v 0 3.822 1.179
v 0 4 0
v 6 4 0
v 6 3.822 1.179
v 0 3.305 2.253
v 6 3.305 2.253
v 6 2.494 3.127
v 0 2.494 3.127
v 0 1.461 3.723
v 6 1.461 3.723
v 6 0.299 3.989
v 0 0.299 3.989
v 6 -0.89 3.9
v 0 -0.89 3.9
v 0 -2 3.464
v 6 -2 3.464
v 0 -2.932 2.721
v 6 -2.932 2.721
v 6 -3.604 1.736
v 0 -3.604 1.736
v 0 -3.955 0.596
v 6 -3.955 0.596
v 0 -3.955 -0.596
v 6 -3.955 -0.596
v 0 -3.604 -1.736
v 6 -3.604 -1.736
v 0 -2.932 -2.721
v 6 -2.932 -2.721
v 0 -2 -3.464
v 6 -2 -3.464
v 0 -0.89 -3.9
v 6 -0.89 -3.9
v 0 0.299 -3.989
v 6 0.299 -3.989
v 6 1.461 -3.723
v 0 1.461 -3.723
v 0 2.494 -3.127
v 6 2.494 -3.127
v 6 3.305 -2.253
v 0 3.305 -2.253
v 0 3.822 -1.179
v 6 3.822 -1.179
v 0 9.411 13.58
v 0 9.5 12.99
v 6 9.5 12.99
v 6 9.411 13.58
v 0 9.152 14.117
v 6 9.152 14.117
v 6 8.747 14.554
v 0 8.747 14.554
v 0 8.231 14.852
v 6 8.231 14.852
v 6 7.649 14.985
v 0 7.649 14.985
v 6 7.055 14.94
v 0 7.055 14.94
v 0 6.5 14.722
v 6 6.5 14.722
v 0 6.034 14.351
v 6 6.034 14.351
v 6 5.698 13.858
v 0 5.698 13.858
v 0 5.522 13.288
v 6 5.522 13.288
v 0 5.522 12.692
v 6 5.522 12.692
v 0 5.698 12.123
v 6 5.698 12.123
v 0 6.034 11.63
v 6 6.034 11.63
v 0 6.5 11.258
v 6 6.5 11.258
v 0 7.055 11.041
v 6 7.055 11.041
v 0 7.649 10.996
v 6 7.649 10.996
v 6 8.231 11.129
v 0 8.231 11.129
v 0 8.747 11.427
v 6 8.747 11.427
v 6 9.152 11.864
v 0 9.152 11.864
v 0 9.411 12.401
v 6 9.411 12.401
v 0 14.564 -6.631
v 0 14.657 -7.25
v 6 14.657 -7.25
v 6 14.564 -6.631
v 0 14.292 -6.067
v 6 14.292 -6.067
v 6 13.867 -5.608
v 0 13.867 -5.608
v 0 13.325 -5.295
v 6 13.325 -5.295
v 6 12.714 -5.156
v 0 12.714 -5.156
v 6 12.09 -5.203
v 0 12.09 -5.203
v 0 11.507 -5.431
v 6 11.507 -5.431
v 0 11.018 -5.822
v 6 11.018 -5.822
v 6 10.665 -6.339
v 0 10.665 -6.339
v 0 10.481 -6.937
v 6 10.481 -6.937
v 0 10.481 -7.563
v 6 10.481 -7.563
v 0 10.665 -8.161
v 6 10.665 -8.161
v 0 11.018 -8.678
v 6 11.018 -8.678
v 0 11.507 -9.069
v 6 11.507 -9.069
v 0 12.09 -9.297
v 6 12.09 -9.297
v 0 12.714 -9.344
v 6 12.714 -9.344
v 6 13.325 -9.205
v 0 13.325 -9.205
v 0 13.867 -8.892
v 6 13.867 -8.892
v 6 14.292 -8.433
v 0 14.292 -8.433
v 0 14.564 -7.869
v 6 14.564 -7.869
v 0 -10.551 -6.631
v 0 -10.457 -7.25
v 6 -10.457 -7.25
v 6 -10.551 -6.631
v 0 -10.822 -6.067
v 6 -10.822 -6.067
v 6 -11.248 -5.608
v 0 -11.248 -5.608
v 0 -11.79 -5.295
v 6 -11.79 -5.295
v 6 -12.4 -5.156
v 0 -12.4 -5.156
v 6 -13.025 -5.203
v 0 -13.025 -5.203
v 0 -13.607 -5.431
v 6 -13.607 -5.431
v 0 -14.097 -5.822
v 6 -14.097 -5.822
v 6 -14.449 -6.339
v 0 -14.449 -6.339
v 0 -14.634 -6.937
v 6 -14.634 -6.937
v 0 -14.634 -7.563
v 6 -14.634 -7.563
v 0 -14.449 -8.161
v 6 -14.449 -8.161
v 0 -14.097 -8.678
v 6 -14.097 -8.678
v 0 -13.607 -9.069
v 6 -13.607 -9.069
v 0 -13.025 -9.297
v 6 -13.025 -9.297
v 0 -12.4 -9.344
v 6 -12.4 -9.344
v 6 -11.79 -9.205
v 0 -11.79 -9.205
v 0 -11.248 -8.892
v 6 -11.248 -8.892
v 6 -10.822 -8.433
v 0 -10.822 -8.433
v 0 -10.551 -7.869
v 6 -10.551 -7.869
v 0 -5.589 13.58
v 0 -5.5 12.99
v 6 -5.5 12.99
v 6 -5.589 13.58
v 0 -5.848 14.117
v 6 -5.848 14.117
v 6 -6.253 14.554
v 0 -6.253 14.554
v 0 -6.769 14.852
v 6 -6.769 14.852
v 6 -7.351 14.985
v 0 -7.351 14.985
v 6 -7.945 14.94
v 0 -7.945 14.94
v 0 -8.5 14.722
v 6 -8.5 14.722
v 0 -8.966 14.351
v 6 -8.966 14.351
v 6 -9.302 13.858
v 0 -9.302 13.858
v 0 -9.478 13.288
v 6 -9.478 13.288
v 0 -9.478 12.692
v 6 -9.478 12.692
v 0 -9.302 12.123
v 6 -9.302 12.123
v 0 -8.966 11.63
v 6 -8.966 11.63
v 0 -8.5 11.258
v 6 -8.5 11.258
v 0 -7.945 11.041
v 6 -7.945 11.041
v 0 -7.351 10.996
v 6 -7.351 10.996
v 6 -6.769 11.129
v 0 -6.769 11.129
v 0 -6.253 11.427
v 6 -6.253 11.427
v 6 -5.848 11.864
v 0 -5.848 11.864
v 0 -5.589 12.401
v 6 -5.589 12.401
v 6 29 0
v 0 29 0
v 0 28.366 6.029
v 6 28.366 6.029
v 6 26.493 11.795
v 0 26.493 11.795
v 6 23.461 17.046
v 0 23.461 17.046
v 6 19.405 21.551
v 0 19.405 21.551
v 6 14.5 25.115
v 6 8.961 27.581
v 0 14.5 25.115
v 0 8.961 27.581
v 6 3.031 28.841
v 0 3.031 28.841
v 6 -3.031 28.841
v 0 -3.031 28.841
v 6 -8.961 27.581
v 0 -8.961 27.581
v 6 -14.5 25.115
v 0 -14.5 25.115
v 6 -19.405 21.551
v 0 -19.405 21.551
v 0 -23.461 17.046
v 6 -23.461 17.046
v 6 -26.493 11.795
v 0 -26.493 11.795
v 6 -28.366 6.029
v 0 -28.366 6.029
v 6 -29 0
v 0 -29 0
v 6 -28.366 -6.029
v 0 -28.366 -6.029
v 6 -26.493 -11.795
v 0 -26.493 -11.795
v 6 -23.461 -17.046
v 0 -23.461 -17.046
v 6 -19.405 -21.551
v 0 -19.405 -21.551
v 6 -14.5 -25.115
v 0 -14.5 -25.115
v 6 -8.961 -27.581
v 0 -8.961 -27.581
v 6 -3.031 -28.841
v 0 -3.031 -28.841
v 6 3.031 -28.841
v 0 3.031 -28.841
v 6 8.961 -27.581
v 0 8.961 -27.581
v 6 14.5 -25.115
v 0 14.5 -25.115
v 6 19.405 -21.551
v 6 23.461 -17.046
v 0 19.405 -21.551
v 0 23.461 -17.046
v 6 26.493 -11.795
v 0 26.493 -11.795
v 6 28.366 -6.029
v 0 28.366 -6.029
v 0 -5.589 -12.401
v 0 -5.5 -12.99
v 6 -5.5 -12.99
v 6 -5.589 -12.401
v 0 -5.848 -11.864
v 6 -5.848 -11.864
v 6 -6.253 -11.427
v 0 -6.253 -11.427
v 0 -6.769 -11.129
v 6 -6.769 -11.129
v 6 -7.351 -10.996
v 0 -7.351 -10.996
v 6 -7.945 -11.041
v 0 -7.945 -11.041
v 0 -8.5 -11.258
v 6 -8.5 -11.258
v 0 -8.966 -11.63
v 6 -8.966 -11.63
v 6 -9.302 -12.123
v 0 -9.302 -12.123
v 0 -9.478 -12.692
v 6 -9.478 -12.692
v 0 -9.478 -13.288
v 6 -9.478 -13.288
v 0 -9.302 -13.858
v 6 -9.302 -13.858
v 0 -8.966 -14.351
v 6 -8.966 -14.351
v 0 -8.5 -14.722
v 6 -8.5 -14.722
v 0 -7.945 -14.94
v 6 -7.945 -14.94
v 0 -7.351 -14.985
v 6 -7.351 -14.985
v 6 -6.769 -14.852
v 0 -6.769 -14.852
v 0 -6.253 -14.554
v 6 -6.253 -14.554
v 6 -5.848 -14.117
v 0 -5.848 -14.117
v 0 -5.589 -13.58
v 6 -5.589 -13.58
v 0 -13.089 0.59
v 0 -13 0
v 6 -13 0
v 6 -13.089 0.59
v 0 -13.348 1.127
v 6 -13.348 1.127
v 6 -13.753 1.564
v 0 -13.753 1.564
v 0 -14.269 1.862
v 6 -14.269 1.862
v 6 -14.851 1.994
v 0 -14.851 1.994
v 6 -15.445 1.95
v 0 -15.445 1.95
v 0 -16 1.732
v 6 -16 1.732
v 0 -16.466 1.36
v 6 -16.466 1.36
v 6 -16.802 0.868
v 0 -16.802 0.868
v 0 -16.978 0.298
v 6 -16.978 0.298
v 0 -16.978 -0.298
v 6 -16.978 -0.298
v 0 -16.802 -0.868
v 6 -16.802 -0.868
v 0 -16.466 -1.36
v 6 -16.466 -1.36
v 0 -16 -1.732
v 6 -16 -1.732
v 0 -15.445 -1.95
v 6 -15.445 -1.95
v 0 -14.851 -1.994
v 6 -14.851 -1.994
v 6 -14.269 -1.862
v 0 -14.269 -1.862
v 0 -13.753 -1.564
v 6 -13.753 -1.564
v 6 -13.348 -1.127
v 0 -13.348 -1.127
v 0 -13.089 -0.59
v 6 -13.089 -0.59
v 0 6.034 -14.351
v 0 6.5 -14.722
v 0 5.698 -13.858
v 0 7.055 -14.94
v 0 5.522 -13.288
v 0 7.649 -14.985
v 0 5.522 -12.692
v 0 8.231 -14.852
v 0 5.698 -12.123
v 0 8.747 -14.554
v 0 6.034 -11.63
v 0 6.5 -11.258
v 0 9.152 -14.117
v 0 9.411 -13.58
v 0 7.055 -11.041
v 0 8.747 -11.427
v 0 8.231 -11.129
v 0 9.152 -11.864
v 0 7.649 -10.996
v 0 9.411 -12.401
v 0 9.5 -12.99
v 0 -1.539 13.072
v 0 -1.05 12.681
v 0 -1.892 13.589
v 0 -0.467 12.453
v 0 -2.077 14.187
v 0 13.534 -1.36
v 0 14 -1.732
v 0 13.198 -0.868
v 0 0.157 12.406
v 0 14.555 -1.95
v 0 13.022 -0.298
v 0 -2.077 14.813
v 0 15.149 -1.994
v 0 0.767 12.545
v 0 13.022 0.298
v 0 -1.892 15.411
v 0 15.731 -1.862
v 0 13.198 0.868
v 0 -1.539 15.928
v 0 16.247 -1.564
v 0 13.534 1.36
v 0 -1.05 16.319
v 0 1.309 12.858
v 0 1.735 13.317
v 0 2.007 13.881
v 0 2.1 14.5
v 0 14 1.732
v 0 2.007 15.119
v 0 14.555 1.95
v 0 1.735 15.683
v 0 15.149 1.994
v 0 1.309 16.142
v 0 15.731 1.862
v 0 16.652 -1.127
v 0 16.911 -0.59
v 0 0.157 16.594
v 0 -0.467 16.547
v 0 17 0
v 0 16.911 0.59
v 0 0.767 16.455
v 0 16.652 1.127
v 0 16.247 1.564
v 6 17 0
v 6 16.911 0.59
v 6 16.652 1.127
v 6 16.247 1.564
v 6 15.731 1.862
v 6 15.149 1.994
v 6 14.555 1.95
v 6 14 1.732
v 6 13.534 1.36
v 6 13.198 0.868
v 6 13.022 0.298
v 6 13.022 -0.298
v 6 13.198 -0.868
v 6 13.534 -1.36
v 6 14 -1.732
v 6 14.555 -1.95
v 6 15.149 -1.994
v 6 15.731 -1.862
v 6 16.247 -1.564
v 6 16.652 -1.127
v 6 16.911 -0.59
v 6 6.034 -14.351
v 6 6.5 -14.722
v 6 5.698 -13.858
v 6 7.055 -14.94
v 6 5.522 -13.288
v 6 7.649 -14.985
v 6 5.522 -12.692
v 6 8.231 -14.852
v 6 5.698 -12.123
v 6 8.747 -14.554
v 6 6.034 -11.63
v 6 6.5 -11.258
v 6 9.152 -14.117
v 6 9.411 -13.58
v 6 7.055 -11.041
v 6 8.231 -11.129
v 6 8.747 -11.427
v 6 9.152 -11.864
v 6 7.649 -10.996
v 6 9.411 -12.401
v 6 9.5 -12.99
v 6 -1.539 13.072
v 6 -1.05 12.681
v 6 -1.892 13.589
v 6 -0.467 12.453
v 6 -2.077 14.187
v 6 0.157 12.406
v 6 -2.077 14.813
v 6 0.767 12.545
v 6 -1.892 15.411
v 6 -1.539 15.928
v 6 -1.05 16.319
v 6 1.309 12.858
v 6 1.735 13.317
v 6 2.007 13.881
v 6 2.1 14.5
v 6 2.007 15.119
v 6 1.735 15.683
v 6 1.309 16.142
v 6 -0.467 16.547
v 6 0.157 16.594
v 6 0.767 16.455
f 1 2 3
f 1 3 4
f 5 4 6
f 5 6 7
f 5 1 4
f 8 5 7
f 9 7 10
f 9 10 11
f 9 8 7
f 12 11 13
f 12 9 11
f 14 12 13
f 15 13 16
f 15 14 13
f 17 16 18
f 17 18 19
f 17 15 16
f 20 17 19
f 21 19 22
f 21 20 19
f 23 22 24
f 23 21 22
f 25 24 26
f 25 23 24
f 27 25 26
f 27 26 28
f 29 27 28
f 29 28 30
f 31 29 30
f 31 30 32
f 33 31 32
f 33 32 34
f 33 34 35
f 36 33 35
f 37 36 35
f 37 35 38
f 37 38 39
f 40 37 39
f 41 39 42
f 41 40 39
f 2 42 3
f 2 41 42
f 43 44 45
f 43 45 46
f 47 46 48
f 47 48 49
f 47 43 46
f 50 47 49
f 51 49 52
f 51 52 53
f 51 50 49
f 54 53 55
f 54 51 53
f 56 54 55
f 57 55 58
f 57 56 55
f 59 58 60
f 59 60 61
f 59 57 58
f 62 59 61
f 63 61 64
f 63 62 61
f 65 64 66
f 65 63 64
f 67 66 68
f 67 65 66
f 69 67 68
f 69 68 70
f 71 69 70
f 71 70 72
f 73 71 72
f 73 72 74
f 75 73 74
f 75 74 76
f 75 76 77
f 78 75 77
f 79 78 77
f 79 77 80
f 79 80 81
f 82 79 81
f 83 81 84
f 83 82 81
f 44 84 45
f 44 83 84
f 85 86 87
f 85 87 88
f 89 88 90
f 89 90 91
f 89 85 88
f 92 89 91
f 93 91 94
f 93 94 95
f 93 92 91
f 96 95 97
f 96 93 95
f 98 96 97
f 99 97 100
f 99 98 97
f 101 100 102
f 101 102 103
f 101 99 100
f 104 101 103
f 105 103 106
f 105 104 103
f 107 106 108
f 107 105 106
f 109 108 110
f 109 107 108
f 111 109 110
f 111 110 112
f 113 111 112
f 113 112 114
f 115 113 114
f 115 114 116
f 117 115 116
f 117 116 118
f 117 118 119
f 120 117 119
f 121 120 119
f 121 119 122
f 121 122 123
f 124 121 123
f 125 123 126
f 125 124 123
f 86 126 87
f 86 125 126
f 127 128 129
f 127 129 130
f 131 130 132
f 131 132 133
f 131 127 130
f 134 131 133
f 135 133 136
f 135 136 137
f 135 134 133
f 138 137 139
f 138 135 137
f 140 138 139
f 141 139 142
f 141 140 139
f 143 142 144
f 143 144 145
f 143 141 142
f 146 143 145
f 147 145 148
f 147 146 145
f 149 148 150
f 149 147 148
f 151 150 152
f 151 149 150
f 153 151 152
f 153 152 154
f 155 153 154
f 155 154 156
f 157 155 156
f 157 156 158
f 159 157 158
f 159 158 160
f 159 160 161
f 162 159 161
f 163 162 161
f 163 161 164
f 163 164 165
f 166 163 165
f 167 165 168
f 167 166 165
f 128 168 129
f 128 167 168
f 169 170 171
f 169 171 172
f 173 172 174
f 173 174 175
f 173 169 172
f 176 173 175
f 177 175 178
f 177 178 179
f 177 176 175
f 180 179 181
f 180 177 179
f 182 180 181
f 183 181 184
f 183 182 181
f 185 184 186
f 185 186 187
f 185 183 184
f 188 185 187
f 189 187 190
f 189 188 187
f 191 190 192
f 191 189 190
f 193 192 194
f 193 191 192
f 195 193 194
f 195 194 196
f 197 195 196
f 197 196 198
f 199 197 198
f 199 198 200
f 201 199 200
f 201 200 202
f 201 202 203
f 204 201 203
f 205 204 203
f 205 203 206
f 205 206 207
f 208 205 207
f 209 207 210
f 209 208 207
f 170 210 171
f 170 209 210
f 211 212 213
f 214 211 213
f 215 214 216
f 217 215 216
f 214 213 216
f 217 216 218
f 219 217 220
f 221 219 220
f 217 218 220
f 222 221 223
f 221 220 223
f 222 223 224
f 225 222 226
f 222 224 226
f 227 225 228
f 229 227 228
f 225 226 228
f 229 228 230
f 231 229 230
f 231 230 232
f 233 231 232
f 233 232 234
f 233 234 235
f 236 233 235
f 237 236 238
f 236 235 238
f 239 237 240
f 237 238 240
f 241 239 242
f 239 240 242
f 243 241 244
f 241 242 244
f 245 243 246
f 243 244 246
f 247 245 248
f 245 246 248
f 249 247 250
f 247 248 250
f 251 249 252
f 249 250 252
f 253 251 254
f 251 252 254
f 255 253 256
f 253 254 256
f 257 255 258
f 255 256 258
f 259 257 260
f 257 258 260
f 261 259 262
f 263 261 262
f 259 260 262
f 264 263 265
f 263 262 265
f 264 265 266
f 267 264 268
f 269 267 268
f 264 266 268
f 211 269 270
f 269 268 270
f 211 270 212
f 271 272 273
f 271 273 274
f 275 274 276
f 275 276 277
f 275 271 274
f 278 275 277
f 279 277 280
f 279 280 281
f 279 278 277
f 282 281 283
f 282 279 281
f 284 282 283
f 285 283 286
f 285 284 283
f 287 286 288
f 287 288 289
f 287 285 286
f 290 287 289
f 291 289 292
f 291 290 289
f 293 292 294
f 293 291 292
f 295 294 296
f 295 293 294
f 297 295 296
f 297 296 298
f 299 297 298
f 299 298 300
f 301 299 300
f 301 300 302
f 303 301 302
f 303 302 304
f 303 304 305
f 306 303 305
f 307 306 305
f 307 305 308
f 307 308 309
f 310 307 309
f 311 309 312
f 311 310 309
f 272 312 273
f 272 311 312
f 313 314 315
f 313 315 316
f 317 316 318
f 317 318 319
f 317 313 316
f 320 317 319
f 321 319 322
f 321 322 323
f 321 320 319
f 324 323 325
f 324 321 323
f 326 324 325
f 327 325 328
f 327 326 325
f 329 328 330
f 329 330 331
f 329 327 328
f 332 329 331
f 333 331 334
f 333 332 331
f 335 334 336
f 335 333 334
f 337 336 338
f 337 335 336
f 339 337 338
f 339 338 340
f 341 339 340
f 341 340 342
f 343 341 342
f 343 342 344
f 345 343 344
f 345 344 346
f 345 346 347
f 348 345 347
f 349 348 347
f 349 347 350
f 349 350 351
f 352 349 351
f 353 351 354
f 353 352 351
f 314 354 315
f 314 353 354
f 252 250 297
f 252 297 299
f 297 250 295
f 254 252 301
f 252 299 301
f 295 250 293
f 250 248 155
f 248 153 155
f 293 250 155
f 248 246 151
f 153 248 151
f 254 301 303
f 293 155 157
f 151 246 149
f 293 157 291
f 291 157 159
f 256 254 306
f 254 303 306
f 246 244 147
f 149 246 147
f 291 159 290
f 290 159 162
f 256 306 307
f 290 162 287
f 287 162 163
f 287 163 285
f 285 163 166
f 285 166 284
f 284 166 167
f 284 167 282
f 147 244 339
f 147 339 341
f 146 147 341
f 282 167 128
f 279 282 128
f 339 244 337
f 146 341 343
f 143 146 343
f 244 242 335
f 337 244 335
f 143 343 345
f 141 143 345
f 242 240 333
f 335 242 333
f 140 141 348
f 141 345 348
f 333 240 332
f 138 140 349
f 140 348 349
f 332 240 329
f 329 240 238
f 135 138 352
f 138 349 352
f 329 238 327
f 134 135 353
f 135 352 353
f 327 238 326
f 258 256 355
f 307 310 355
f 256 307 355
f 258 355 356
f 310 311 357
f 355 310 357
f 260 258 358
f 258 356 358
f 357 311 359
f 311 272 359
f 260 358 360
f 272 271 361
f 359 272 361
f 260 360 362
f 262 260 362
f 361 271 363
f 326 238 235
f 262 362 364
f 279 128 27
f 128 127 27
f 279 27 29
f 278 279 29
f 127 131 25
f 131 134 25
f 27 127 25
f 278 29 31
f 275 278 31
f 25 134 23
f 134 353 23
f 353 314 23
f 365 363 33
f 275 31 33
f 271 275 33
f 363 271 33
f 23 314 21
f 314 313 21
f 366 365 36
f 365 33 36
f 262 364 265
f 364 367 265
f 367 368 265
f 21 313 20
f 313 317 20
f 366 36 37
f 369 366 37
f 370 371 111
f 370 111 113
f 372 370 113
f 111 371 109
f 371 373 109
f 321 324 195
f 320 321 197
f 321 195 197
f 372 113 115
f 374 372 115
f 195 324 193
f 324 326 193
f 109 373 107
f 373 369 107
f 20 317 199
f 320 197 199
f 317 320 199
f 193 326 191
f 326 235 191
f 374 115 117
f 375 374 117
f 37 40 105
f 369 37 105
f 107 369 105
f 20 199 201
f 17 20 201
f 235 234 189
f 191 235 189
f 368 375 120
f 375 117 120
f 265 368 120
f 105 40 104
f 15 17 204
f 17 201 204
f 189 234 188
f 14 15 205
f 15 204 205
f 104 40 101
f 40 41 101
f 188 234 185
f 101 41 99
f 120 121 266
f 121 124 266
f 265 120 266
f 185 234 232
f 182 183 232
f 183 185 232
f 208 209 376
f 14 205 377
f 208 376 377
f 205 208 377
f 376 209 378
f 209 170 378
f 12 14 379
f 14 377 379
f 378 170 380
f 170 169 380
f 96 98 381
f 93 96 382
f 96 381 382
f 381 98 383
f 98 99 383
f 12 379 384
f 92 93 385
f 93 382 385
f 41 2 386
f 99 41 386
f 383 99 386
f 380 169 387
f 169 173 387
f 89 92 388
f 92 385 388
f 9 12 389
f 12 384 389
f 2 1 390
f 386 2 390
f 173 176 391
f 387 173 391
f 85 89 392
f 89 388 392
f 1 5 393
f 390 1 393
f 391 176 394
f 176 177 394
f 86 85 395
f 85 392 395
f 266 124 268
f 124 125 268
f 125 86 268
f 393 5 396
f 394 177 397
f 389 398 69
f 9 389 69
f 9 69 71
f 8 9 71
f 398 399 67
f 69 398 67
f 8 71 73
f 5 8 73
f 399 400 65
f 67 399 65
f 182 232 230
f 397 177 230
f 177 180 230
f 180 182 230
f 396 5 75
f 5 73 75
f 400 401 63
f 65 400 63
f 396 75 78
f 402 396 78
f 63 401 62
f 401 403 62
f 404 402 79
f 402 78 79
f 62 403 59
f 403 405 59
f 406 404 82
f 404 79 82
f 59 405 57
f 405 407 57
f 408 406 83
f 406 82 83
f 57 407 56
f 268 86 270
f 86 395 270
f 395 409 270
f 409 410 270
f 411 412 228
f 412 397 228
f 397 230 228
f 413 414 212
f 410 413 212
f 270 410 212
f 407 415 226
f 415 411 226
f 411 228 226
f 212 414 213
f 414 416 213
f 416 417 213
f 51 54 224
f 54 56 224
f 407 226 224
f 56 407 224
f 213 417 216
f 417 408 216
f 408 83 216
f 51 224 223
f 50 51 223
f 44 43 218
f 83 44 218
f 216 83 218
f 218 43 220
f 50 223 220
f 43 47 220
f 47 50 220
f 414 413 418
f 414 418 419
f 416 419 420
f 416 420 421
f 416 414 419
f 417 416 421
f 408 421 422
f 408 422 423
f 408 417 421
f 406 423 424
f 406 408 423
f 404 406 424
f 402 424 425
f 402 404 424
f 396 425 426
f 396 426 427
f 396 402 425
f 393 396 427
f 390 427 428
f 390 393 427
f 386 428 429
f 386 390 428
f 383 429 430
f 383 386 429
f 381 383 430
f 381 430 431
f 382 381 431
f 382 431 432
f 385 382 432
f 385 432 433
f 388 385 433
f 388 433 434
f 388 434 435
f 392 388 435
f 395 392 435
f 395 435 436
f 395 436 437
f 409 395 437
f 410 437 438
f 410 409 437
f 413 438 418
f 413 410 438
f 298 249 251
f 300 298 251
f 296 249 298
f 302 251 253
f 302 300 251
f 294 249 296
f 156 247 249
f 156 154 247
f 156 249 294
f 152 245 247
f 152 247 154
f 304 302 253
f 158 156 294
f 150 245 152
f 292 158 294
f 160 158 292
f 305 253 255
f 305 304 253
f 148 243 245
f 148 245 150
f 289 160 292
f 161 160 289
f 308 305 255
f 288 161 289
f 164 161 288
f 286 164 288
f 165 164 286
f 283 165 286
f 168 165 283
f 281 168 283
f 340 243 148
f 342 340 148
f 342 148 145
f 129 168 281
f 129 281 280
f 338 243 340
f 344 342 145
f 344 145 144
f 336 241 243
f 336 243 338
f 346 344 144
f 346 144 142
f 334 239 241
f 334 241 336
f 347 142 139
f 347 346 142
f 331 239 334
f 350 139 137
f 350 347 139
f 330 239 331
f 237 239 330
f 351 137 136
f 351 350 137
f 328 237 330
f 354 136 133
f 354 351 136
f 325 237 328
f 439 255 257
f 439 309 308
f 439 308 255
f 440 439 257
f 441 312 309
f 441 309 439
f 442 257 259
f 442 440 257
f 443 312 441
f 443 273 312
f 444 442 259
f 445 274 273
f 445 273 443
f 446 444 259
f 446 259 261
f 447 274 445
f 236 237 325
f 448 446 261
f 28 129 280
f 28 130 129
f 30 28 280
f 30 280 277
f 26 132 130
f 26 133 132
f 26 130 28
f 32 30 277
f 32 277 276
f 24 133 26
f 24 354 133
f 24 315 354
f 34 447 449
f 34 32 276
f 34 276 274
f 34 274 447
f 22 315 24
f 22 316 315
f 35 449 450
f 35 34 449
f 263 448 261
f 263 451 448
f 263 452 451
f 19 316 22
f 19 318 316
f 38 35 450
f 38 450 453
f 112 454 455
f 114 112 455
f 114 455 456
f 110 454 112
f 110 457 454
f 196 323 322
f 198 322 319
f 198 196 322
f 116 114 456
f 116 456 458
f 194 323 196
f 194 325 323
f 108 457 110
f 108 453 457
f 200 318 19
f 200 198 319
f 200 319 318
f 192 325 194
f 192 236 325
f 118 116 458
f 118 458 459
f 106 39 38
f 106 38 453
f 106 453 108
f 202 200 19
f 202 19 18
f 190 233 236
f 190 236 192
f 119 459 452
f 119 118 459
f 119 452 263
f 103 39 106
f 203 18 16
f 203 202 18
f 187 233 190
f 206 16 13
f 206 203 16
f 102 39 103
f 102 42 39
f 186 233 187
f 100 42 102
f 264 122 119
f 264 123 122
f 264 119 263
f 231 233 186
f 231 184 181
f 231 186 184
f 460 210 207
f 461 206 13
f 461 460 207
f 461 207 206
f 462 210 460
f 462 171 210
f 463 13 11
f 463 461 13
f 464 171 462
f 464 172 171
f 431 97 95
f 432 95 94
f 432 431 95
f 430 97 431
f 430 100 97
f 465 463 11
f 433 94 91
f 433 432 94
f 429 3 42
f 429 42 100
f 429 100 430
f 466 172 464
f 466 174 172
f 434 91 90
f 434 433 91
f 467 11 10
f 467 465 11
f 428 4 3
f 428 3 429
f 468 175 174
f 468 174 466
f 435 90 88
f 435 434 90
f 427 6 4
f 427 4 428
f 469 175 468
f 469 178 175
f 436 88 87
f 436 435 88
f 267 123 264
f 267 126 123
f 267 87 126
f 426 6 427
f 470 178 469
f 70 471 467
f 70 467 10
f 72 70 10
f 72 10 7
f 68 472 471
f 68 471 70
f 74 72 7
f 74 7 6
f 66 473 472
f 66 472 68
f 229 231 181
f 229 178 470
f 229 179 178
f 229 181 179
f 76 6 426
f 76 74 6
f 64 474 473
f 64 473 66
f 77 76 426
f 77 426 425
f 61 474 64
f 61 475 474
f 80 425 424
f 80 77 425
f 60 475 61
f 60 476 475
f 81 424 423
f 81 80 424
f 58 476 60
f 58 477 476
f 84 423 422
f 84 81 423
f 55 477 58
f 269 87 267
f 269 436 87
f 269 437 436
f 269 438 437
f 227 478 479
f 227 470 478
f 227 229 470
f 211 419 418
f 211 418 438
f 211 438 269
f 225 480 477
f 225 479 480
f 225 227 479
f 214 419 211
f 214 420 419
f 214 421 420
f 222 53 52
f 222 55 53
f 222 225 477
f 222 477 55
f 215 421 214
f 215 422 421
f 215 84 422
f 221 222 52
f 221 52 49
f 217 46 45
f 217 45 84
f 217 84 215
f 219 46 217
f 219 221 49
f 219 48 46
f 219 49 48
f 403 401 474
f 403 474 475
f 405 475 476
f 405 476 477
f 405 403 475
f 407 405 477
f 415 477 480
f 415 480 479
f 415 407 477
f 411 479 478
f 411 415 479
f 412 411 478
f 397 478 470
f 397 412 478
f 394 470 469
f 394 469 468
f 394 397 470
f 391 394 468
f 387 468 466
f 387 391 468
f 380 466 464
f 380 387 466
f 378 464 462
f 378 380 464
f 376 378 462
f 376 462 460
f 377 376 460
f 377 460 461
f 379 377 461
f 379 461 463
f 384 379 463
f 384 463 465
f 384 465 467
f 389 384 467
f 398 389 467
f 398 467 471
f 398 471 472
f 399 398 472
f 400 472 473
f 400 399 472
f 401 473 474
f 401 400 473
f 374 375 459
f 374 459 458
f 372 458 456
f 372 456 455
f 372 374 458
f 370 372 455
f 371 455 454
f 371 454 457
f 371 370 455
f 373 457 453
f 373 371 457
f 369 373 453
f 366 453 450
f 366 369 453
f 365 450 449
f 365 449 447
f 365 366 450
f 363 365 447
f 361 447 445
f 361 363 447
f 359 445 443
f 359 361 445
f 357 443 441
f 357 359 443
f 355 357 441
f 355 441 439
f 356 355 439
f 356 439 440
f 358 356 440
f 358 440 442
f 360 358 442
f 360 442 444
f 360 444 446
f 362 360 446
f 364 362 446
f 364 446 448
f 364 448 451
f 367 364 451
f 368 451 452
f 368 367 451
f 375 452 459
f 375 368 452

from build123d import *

# Parameters (mm, degrees)
F0_R     = 29
F0_R_2   = 2
F0_R_3   = 2.1
F0_R_4   = 4
F1_DEPTH = 6


with BuildPart() as f1:
    # F0 (on Right) → F1 (new body)
    with BuildSketch(Plane.YZ):
        Circle(F0_R)
        with Locations((-7.5, -12.990381)):
            Circle(F0_R_2, mode=Mode.SUBTRACT)
        with Locations((-12.557368, -7.25)):
            Circle(F0_R_3, mode=Mode.SUBTRACT)
        with Locations((7.5, -12.990381)):
            Circle(F0_R_2, mode=Mode.SUBTRACT)
        with Locations((12.557368, -7.25)):
            Circle(F0_R_3, mode=Mode.SUBTRACT)
        with Locations((-15, 0)):
            Circle(F0_R_2, mode=Mode.SUBTRACT)
        with Locations((-7.5, 12.990381)):
            Circle(F0_R_2, mode=Mode.SUBTRACT)
        Circle(F0_R_4, mode=Mode.SUBTRACT)
        with Locations((7.5, 12.990381)):
            Circle(F0_R_2, mode=Mode.SUBTRACT)
        with Locations((15, 0)):
            Circle(F0_R_2, mode=Mode.SUBTRACT)
        with Locations((0, 14.5)):
            Circle(F0_R_3, mode=Mode.SUBTRACT)
    extrude(amount=F1_DEPTH)


solid = f1.part
